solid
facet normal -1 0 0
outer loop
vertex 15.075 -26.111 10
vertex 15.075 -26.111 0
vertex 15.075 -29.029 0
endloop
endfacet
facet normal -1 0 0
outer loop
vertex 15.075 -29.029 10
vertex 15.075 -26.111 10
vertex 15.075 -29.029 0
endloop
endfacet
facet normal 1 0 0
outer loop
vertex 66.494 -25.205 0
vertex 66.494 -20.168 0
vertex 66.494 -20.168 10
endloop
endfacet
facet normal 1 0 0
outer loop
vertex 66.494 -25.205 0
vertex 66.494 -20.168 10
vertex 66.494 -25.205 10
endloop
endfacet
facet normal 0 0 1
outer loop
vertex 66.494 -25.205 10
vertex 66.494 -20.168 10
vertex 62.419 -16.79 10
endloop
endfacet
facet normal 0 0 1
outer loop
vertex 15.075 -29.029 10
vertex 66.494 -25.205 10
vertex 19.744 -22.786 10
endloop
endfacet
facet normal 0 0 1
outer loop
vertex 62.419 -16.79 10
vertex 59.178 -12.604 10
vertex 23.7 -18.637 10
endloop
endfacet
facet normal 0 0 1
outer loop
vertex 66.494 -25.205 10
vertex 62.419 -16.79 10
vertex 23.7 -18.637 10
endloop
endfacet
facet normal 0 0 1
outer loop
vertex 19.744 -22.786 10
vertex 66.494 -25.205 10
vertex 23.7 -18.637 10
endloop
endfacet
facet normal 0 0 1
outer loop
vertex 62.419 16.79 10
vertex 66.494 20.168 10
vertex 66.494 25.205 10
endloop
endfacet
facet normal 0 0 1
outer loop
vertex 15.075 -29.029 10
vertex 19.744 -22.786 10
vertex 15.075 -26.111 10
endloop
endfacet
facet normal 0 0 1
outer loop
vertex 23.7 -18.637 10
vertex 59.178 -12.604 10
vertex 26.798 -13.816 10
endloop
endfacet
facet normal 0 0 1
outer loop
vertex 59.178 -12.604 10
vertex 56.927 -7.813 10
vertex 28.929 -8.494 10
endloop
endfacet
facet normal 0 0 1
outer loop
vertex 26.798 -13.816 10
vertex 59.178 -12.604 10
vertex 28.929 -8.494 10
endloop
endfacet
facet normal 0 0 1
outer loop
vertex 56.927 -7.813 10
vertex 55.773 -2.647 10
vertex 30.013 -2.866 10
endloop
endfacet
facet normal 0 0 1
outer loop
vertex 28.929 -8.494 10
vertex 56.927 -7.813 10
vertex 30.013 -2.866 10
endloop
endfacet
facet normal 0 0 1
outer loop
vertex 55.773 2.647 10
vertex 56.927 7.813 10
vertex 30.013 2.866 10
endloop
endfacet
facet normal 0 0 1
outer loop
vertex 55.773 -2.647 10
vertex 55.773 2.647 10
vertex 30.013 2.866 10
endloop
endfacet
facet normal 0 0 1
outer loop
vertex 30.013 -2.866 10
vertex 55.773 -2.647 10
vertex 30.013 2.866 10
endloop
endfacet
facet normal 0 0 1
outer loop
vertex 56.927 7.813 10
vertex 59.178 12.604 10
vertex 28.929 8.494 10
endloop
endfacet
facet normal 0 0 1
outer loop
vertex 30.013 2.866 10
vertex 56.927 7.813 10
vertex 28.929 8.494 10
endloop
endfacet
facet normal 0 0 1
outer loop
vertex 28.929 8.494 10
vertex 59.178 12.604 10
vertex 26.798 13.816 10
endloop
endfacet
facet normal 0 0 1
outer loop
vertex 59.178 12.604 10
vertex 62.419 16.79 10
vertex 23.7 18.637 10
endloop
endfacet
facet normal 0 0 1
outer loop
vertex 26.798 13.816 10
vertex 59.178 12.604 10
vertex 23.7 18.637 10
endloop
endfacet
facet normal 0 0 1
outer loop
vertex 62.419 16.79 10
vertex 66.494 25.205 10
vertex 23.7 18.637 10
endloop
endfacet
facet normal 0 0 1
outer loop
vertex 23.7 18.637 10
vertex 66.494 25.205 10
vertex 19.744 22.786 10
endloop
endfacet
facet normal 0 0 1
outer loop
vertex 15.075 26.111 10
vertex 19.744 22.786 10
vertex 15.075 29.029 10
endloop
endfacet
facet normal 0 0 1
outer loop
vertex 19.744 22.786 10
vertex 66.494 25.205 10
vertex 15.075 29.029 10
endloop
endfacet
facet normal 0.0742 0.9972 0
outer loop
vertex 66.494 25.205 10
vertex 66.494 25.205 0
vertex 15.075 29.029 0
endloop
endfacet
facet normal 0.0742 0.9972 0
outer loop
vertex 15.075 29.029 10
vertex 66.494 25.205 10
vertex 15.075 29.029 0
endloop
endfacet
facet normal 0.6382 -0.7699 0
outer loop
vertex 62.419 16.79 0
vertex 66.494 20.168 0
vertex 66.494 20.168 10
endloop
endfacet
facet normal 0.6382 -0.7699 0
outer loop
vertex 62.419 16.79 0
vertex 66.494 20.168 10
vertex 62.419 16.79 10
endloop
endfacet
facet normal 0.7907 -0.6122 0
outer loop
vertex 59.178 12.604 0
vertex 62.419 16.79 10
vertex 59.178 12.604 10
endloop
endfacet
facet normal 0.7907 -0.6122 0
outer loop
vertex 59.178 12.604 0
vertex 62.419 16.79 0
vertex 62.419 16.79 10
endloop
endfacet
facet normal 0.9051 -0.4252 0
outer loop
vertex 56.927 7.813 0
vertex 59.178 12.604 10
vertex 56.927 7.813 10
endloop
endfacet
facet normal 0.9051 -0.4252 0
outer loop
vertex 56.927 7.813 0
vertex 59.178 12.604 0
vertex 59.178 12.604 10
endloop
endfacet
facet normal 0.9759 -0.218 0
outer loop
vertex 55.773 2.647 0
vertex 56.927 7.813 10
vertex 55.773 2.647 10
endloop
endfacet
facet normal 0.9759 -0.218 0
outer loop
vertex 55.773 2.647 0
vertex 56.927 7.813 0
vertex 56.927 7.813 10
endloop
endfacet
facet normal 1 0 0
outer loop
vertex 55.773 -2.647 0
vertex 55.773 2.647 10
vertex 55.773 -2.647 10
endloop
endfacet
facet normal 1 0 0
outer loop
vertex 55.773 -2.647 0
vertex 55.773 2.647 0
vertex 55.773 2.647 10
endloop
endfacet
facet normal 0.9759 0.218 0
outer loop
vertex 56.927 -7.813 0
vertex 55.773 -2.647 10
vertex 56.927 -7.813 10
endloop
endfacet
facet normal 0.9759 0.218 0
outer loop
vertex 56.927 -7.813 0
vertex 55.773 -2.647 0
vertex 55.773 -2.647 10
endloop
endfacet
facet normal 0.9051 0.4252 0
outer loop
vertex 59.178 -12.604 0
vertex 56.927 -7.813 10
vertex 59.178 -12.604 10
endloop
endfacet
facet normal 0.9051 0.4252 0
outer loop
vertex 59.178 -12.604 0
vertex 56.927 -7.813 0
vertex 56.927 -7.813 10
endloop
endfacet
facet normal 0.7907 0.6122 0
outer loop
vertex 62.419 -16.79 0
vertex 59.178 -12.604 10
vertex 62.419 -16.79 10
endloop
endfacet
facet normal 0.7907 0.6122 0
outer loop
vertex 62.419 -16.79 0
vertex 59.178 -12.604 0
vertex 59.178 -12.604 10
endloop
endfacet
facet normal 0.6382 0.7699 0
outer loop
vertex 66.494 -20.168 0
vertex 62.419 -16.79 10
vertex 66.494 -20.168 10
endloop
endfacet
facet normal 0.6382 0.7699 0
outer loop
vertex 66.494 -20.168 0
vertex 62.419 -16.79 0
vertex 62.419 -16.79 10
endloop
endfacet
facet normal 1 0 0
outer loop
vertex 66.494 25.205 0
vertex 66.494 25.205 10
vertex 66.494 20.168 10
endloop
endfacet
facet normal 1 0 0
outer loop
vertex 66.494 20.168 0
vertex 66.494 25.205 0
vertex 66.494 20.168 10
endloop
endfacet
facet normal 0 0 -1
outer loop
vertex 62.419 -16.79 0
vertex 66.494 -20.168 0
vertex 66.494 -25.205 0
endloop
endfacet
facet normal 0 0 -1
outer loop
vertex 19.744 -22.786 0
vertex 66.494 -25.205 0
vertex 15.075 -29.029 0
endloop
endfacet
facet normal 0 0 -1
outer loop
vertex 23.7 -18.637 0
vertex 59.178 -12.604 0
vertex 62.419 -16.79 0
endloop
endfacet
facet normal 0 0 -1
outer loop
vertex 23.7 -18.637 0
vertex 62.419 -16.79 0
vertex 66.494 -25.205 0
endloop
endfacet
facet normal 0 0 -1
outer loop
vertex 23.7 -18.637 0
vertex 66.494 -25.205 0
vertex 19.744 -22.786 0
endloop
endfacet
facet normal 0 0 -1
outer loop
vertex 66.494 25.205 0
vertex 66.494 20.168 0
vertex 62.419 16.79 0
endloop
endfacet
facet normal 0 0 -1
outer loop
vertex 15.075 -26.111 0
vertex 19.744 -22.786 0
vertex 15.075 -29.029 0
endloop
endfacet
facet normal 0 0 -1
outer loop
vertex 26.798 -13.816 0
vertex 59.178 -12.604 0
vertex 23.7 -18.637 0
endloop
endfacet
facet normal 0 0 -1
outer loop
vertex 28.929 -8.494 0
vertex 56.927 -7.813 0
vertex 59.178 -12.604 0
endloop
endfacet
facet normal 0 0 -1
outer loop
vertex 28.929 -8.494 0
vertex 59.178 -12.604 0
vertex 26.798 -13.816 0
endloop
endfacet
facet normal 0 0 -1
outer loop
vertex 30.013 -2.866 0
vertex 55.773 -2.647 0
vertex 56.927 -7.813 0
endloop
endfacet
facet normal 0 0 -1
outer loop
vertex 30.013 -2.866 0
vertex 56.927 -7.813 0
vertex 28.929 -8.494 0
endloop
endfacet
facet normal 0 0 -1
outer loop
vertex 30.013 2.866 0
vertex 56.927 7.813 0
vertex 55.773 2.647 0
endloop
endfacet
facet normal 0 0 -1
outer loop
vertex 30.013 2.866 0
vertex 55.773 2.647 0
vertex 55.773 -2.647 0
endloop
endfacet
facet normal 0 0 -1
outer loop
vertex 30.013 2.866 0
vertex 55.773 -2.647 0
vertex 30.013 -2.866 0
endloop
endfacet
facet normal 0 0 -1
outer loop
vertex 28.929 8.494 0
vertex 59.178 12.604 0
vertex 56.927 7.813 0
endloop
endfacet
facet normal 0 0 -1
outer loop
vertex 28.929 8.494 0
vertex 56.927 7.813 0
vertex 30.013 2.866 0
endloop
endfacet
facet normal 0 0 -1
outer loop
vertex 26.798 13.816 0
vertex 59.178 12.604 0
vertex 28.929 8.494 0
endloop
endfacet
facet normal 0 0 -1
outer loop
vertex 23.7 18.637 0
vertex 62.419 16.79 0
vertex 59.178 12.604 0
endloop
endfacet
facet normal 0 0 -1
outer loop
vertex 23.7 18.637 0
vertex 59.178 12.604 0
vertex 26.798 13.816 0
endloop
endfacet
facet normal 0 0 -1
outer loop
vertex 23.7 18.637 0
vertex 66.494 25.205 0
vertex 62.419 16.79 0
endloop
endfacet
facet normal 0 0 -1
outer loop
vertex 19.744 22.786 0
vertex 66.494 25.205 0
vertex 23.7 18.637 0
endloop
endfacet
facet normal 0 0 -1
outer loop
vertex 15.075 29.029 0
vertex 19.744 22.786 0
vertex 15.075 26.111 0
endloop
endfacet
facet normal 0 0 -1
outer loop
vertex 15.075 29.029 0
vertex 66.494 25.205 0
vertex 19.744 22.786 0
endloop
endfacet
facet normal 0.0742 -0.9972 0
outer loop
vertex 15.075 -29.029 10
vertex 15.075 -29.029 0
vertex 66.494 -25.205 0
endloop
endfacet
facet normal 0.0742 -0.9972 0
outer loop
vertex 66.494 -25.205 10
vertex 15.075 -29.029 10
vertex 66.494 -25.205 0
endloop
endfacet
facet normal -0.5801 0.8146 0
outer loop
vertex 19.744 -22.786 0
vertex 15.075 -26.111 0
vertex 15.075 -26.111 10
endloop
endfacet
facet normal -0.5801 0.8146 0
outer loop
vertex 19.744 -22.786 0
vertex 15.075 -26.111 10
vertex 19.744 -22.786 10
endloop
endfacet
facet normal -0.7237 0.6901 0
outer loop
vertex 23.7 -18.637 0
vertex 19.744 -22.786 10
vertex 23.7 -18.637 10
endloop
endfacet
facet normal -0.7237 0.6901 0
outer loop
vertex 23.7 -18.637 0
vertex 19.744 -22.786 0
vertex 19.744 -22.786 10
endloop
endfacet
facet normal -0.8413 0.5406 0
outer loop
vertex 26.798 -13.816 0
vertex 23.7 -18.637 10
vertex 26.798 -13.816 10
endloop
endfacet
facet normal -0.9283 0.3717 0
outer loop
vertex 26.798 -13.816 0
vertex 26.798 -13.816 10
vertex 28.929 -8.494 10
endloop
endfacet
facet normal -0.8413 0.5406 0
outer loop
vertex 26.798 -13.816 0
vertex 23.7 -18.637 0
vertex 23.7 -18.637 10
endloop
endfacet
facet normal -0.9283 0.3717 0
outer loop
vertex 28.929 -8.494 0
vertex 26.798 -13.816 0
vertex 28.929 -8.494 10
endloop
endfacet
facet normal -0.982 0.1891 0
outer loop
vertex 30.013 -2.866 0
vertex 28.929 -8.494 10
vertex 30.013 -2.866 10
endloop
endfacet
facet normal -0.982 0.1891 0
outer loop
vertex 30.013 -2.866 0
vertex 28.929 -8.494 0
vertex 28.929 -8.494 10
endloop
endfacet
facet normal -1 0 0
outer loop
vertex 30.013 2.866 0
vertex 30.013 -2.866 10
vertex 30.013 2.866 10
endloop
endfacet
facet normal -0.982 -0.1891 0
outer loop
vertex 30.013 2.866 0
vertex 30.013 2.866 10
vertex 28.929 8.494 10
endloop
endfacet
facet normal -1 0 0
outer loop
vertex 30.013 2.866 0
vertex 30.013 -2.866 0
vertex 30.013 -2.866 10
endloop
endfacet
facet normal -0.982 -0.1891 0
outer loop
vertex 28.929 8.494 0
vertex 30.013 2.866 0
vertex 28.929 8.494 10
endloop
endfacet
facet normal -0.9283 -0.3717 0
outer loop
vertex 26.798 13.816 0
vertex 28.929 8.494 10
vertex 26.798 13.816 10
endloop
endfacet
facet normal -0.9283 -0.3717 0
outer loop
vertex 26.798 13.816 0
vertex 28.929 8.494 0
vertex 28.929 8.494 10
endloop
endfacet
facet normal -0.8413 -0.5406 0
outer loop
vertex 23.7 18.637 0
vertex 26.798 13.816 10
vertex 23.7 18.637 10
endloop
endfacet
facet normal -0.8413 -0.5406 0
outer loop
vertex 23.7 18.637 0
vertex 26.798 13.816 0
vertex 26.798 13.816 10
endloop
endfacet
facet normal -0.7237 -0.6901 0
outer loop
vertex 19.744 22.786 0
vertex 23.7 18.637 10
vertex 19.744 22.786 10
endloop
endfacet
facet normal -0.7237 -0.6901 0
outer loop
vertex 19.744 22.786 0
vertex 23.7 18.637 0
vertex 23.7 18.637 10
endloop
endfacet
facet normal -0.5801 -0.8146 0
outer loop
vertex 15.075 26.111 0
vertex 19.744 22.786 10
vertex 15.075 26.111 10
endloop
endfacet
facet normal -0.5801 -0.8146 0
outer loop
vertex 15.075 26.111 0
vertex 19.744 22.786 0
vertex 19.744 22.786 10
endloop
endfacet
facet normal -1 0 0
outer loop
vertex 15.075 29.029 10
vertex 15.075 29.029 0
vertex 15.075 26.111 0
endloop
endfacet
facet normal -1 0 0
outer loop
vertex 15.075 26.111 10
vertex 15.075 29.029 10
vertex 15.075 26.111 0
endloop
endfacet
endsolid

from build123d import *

# Parameters (mm, degrees)
PAD_DEPTH = 10


with BuildPart() as part:
    # Sketch → Pad (new body)
    with BuildSketch(Plane.XY):
        with BuildLine():
            ThreePointArc((15.075, -26.110666), (30.15, 0), (15.075, 26.110666))
            Line((15.075, 29.028831), (15.075, 26.110666))
            Line((66.494071, 25.204654), (15.075, 29.028831))
            Line((66.494071, 25.204654), (66.494071, 20.16834))
            ThreePointArc((66.494071, 20.16834), (55.627916, 0), (66.494071, -20.16834))
            Line((66.494071, -20.16834), (66.494071, -25.204654))
            Line((15.075, -29.028831), (66.494071, -25.204654))
            Line((15.075, -26.110666), (15.075, -29.028831))
        make_face()
    extrude(amount=PAD_DEPTH)


solid = part.part
